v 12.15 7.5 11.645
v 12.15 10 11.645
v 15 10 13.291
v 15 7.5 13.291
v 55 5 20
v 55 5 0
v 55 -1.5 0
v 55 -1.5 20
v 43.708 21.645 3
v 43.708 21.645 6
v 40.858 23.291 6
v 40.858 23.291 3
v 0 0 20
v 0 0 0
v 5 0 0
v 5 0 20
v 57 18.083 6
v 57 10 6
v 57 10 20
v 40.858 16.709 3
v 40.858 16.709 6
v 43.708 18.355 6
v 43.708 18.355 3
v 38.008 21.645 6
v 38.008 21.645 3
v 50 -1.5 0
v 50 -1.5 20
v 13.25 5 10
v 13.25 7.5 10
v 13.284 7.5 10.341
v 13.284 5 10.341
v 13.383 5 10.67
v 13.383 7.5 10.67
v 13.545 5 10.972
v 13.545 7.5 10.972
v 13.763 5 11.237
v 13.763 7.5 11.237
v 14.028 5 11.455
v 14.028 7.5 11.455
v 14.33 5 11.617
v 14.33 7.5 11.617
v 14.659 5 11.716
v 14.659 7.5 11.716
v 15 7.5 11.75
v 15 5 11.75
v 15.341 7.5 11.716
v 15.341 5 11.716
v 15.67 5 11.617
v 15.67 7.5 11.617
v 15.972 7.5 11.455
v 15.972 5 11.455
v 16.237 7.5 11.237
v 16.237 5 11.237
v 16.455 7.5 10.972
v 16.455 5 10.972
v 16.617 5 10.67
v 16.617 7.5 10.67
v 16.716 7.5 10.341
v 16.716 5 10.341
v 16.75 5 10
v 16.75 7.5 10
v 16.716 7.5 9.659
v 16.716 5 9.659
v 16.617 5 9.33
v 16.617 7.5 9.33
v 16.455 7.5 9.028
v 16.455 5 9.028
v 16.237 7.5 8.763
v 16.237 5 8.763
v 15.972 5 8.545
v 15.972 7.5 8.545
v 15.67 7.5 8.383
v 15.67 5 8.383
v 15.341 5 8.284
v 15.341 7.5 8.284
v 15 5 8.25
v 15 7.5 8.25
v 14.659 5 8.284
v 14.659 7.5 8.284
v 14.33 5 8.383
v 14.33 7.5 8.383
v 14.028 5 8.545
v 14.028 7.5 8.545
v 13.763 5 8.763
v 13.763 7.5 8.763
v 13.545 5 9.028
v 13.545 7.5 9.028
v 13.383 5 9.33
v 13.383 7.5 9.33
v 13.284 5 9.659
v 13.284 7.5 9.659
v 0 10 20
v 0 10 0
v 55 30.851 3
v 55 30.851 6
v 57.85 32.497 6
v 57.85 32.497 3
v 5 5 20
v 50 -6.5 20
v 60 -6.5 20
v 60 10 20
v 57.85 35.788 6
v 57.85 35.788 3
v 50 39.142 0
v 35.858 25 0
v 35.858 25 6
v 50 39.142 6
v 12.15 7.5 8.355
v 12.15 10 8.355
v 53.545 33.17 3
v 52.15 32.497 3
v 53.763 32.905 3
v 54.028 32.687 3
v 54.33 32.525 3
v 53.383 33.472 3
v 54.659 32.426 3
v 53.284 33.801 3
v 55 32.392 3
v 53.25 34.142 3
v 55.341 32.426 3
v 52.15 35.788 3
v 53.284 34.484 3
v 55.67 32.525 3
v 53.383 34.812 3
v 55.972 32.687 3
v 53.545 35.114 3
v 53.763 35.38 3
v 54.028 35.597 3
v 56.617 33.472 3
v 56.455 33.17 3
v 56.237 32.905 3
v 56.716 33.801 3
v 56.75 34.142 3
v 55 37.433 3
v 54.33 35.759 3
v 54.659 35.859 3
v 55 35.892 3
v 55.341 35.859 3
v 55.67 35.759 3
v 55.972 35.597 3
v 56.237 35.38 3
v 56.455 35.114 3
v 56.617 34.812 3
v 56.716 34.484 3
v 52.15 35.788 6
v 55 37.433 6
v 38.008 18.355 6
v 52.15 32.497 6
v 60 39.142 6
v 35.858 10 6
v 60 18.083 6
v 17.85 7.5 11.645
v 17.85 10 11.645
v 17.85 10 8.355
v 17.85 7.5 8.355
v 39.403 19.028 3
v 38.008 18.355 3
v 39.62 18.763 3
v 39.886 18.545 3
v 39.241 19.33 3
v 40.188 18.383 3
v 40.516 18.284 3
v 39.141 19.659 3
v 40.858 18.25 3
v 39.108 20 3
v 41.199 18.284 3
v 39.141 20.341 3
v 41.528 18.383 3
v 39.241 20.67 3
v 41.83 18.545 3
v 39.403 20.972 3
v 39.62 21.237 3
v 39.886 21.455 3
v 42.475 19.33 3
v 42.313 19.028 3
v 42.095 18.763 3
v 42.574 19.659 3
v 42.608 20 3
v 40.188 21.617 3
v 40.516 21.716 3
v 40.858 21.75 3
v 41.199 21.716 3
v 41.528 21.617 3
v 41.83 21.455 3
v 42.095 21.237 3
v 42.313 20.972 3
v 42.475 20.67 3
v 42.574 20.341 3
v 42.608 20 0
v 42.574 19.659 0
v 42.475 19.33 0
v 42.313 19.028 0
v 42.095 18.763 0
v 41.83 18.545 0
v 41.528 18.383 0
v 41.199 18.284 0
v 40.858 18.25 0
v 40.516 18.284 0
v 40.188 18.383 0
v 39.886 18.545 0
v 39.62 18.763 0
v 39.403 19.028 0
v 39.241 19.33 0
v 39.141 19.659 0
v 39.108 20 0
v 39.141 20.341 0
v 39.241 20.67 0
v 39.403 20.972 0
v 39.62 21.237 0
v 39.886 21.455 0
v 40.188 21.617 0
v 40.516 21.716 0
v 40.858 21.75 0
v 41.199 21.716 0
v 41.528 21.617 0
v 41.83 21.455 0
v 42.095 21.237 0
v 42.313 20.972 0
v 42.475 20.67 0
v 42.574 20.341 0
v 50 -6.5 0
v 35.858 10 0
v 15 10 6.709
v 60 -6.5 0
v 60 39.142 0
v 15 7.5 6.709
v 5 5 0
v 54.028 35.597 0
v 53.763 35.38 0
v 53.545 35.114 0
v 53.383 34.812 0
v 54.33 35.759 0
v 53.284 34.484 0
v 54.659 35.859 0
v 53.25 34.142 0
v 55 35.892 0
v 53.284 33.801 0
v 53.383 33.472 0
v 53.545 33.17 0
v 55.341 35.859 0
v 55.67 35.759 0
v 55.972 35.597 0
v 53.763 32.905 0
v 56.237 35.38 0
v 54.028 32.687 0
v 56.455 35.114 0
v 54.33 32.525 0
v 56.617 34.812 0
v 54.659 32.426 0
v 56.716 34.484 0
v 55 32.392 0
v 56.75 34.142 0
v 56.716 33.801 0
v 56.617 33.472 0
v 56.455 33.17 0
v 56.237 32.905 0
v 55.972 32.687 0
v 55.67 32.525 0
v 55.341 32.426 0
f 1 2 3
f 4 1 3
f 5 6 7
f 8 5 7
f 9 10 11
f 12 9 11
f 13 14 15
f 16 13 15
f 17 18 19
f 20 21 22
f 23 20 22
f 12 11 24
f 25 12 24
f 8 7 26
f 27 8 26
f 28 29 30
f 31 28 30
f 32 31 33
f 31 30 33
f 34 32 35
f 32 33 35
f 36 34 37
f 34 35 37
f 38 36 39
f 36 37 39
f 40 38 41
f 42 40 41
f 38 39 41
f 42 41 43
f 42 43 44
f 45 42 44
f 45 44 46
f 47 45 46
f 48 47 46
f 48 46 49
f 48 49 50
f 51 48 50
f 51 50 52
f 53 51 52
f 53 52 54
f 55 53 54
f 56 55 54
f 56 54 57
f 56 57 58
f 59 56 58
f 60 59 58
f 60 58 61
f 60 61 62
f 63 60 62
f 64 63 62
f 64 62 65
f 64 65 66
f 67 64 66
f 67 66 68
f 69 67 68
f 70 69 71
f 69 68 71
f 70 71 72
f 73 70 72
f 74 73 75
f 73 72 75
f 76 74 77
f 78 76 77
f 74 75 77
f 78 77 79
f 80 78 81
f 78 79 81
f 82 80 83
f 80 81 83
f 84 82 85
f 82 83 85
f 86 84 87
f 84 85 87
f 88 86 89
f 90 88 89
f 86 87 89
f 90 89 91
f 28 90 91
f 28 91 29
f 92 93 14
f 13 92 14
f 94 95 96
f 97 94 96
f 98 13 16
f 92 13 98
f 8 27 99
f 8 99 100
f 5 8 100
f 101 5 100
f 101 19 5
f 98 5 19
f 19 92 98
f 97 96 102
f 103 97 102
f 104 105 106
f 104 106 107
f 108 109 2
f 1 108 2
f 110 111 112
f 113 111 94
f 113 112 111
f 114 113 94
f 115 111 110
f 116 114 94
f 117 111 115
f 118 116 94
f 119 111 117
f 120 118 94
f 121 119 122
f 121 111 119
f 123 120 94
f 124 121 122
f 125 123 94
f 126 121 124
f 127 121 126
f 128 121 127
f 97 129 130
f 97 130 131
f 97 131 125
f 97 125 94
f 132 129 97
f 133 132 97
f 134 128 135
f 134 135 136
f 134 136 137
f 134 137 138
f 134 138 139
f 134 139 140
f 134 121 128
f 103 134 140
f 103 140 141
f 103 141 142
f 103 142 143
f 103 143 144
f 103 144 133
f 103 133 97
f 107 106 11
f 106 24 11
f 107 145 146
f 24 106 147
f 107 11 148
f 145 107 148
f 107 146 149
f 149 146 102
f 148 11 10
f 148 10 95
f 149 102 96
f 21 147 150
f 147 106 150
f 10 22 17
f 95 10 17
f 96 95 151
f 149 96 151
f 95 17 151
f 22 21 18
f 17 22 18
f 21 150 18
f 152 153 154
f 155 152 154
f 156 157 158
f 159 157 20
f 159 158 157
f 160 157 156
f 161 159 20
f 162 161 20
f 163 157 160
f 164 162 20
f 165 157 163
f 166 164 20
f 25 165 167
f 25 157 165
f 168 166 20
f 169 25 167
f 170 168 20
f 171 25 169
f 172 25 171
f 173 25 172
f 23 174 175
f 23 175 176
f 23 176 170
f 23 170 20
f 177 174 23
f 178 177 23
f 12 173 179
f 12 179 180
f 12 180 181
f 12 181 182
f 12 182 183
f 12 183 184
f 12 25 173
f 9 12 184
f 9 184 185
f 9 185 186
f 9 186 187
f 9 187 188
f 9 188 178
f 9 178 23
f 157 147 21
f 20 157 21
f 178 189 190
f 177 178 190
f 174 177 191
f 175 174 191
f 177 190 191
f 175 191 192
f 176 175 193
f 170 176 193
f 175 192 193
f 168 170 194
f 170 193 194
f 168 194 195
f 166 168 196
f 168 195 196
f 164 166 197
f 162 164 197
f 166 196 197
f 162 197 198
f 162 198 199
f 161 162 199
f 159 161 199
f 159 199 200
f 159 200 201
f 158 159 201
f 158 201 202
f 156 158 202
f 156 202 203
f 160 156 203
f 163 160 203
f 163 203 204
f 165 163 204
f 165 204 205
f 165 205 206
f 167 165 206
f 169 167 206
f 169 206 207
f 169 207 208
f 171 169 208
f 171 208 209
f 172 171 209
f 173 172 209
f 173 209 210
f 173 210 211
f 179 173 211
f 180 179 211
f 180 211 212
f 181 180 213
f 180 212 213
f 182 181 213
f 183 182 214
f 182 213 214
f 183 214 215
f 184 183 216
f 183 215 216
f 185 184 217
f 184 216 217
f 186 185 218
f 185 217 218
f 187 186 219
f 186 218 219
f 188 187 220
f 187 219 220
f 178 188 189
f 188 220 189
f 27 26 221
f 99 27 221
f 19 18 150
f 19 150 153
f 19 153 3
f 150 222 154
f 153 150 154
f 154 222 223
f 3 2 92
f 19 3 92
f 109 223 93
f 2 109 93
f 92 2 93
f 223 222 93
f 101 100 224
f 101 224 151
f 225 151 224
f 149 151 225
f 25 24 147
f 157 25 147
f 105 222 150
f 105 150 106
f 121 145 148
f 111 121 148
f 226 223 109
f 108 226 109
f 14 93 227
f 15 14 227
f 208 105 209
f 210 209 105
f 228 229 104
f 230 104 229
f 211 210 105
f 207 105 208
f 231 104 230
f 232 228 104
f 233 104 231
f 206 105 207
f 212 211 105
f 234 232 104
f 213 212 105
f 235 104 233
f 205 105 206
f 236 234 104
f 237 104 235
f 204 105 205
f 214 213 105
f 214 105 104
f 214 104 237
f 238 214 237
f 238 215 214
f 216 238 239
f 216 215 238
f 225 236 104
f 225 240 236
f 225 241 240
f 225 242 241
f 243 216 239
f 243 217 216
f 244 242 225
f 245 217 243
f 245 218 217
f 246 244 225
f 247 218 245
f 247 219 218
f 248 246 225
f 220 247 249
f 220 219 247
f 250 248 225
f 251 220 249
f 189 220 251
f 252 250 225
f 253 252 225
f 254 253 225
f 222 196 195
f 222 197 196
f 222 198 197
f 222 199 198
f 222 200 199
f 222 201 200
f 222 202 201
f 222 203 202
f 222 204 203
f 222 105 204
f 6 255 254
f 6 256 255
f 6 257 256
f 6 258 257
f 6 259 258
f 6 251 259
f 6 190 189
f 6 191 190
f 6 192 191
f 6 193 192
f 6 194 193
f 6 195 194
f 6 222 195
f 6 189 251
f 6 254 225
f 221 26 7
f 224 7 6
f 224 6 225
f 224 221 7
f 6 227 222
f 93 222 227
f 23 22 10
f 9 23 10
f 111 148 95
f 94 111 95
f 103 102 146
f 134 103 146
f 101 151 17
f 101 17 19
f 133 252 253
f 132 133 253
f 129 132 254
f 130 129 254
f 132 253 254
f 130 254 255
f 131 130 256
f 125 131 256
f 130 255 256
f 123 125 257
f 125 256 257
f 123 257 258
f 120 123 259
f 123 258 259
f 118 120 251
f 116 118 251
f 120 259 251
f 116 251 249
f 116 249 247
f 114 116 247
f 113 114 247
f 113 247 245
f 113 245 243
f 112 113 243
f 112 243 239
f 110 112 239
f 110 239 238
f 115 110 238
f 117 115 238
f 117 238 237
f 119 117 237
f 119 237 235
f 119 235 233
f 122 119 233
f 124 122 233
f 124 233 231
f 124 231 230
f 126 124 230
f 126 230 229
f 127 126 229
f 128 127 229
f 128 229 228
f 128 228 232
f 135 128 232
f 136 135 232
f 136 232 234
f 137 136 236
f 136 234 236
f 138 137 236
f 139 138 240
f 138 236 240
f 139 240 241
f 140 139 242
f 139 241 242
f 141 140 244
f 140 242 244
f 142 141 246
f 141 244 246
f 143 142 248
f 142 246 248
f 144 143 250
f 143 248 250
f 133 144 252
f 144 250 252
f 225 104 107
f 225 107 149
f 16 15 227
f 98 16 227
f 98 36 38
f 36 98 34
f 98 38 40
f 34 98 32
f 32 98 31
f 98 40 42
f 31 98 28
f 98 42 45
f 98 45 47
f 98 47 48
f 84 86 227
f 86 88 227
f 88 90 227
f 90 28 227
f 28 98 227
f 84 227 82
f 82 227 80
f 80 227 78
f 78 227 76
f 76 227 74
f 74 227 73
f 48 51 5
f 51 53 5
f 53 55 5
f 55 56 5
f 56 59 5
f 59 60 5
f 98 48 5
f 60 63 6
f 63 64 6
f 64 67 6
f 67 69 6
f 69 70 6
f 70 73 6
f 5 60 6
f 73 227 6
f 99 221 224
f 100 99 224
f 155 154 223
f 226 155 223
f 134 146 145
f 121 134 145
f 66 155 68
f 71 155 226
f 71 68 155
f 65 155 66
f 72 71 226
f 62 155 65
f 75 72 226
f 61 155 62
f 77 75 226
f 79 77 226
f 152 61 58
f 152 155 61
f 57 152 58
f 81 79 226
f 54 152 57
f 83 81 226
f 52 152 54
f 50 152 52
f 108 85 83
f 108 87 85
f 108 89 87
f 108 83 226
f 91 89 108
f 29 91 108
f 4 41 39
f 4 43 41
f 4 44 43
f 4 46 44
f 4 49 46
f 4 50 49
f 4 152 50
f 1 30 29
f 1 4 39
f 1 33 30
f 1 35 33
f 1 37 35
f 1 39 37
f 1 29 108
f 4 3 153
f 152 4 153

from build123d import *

# Parameters (mm, degrees)
F1_DEPTH  = 20
F2_R      = 1.75
F3_DEPTH  = 6
F5_DEPTH  = 3
F7_DEPTH  = 3
F8_R      = 1.75
F9_DEPTH  = 16.501
F11_DEPTH = 2.5


with BuildPart() as f1:
    # F0 (on Top) → F1 (new body)
    with BuildSketch(Plane.XY):
        Polygon((0, 10), (0, 0), (5, 0), (5, 5), (55, 5), (55, -1.5), (50, -1.5), (50, -6.5), (60, -6.5), (60, 10), align=None)
    extrude(amount=F1_DEPTH)

    # F2 (on face) → F3 (join)
    with BuildSketch(Plane(origin=(0, 0, 0), x_dir=(1, 0, 0), z_dir=(0, 0, -1))):
        Polygon((60, -39.142136), (60, -10), (35.857864, -10), (35.857864, -25), (50, -39.142136), align=None)
        with Locations((55, -34.142136)):
            Circle(F2_R, mode=Mode.SUBTRACT)
        with Locations((40.857864, -20)):
            Circle(F2_R, mode=Mode.SUBTRACT)
    extrude(amount=-F3_DEPTH)

    # F4 (on face) → F5 (cut)
    with BuildSketch(Plane.XY.offset(6)):
        Polygon((38.007864, 21.645448), (38.007864, 18.354552), (40.857864, 16.709103), (43.707864, 18.354552), (43.707864, 21.645448), (40.857864, 23.290897), align=None)
        Polygon((57.85, 32.496687), (57.85, 35.787584), (55, 37.433032), (52.15, 35.787584), (52.15, 32.496687), (55, 30.851239), align=None)
    extrude(amount=-F5_DEPTH, mode=Mode.SUBTRACT)

    # F6 (on face) → F7 (join)
    with BuildSketch(Plane.YZ.offset(60)):
        Polygon((18.082904, 6), (10, 20), (10, 6), align=None)
    extrude(amount=-F7_DEPTH)

    # F8 (on face) → F9 (cut, through all)
    with BuildSketch(Plane(origin=(0, 10, 0), x_dir=(-1, 0, 0), z_dir=(0, 1, 0))):
        with Locations((-15, 10)):
            Circle(F8_R)
    extrude(amount=-F9_DEPTH, mode=Mode.SUBTRACT)

    # F10 (on face) → F11 (cut)
    with BuildSketch(Plane(origin=(0, 10, 0), x_dir=(-1, 0, 0), z_dir=(0, 1, 0))):
        Polygon((-12.15, 8.354552), (-12.15, 11.645448), (-15, 13.290897), (-17.85, 11.645448), (-17.85, 8.354552), (-15, 6.709103), align=None)
    extrude(amount=-F11_DEPTH, mode=Mode.SUBTRACT)


solid = f1.part
